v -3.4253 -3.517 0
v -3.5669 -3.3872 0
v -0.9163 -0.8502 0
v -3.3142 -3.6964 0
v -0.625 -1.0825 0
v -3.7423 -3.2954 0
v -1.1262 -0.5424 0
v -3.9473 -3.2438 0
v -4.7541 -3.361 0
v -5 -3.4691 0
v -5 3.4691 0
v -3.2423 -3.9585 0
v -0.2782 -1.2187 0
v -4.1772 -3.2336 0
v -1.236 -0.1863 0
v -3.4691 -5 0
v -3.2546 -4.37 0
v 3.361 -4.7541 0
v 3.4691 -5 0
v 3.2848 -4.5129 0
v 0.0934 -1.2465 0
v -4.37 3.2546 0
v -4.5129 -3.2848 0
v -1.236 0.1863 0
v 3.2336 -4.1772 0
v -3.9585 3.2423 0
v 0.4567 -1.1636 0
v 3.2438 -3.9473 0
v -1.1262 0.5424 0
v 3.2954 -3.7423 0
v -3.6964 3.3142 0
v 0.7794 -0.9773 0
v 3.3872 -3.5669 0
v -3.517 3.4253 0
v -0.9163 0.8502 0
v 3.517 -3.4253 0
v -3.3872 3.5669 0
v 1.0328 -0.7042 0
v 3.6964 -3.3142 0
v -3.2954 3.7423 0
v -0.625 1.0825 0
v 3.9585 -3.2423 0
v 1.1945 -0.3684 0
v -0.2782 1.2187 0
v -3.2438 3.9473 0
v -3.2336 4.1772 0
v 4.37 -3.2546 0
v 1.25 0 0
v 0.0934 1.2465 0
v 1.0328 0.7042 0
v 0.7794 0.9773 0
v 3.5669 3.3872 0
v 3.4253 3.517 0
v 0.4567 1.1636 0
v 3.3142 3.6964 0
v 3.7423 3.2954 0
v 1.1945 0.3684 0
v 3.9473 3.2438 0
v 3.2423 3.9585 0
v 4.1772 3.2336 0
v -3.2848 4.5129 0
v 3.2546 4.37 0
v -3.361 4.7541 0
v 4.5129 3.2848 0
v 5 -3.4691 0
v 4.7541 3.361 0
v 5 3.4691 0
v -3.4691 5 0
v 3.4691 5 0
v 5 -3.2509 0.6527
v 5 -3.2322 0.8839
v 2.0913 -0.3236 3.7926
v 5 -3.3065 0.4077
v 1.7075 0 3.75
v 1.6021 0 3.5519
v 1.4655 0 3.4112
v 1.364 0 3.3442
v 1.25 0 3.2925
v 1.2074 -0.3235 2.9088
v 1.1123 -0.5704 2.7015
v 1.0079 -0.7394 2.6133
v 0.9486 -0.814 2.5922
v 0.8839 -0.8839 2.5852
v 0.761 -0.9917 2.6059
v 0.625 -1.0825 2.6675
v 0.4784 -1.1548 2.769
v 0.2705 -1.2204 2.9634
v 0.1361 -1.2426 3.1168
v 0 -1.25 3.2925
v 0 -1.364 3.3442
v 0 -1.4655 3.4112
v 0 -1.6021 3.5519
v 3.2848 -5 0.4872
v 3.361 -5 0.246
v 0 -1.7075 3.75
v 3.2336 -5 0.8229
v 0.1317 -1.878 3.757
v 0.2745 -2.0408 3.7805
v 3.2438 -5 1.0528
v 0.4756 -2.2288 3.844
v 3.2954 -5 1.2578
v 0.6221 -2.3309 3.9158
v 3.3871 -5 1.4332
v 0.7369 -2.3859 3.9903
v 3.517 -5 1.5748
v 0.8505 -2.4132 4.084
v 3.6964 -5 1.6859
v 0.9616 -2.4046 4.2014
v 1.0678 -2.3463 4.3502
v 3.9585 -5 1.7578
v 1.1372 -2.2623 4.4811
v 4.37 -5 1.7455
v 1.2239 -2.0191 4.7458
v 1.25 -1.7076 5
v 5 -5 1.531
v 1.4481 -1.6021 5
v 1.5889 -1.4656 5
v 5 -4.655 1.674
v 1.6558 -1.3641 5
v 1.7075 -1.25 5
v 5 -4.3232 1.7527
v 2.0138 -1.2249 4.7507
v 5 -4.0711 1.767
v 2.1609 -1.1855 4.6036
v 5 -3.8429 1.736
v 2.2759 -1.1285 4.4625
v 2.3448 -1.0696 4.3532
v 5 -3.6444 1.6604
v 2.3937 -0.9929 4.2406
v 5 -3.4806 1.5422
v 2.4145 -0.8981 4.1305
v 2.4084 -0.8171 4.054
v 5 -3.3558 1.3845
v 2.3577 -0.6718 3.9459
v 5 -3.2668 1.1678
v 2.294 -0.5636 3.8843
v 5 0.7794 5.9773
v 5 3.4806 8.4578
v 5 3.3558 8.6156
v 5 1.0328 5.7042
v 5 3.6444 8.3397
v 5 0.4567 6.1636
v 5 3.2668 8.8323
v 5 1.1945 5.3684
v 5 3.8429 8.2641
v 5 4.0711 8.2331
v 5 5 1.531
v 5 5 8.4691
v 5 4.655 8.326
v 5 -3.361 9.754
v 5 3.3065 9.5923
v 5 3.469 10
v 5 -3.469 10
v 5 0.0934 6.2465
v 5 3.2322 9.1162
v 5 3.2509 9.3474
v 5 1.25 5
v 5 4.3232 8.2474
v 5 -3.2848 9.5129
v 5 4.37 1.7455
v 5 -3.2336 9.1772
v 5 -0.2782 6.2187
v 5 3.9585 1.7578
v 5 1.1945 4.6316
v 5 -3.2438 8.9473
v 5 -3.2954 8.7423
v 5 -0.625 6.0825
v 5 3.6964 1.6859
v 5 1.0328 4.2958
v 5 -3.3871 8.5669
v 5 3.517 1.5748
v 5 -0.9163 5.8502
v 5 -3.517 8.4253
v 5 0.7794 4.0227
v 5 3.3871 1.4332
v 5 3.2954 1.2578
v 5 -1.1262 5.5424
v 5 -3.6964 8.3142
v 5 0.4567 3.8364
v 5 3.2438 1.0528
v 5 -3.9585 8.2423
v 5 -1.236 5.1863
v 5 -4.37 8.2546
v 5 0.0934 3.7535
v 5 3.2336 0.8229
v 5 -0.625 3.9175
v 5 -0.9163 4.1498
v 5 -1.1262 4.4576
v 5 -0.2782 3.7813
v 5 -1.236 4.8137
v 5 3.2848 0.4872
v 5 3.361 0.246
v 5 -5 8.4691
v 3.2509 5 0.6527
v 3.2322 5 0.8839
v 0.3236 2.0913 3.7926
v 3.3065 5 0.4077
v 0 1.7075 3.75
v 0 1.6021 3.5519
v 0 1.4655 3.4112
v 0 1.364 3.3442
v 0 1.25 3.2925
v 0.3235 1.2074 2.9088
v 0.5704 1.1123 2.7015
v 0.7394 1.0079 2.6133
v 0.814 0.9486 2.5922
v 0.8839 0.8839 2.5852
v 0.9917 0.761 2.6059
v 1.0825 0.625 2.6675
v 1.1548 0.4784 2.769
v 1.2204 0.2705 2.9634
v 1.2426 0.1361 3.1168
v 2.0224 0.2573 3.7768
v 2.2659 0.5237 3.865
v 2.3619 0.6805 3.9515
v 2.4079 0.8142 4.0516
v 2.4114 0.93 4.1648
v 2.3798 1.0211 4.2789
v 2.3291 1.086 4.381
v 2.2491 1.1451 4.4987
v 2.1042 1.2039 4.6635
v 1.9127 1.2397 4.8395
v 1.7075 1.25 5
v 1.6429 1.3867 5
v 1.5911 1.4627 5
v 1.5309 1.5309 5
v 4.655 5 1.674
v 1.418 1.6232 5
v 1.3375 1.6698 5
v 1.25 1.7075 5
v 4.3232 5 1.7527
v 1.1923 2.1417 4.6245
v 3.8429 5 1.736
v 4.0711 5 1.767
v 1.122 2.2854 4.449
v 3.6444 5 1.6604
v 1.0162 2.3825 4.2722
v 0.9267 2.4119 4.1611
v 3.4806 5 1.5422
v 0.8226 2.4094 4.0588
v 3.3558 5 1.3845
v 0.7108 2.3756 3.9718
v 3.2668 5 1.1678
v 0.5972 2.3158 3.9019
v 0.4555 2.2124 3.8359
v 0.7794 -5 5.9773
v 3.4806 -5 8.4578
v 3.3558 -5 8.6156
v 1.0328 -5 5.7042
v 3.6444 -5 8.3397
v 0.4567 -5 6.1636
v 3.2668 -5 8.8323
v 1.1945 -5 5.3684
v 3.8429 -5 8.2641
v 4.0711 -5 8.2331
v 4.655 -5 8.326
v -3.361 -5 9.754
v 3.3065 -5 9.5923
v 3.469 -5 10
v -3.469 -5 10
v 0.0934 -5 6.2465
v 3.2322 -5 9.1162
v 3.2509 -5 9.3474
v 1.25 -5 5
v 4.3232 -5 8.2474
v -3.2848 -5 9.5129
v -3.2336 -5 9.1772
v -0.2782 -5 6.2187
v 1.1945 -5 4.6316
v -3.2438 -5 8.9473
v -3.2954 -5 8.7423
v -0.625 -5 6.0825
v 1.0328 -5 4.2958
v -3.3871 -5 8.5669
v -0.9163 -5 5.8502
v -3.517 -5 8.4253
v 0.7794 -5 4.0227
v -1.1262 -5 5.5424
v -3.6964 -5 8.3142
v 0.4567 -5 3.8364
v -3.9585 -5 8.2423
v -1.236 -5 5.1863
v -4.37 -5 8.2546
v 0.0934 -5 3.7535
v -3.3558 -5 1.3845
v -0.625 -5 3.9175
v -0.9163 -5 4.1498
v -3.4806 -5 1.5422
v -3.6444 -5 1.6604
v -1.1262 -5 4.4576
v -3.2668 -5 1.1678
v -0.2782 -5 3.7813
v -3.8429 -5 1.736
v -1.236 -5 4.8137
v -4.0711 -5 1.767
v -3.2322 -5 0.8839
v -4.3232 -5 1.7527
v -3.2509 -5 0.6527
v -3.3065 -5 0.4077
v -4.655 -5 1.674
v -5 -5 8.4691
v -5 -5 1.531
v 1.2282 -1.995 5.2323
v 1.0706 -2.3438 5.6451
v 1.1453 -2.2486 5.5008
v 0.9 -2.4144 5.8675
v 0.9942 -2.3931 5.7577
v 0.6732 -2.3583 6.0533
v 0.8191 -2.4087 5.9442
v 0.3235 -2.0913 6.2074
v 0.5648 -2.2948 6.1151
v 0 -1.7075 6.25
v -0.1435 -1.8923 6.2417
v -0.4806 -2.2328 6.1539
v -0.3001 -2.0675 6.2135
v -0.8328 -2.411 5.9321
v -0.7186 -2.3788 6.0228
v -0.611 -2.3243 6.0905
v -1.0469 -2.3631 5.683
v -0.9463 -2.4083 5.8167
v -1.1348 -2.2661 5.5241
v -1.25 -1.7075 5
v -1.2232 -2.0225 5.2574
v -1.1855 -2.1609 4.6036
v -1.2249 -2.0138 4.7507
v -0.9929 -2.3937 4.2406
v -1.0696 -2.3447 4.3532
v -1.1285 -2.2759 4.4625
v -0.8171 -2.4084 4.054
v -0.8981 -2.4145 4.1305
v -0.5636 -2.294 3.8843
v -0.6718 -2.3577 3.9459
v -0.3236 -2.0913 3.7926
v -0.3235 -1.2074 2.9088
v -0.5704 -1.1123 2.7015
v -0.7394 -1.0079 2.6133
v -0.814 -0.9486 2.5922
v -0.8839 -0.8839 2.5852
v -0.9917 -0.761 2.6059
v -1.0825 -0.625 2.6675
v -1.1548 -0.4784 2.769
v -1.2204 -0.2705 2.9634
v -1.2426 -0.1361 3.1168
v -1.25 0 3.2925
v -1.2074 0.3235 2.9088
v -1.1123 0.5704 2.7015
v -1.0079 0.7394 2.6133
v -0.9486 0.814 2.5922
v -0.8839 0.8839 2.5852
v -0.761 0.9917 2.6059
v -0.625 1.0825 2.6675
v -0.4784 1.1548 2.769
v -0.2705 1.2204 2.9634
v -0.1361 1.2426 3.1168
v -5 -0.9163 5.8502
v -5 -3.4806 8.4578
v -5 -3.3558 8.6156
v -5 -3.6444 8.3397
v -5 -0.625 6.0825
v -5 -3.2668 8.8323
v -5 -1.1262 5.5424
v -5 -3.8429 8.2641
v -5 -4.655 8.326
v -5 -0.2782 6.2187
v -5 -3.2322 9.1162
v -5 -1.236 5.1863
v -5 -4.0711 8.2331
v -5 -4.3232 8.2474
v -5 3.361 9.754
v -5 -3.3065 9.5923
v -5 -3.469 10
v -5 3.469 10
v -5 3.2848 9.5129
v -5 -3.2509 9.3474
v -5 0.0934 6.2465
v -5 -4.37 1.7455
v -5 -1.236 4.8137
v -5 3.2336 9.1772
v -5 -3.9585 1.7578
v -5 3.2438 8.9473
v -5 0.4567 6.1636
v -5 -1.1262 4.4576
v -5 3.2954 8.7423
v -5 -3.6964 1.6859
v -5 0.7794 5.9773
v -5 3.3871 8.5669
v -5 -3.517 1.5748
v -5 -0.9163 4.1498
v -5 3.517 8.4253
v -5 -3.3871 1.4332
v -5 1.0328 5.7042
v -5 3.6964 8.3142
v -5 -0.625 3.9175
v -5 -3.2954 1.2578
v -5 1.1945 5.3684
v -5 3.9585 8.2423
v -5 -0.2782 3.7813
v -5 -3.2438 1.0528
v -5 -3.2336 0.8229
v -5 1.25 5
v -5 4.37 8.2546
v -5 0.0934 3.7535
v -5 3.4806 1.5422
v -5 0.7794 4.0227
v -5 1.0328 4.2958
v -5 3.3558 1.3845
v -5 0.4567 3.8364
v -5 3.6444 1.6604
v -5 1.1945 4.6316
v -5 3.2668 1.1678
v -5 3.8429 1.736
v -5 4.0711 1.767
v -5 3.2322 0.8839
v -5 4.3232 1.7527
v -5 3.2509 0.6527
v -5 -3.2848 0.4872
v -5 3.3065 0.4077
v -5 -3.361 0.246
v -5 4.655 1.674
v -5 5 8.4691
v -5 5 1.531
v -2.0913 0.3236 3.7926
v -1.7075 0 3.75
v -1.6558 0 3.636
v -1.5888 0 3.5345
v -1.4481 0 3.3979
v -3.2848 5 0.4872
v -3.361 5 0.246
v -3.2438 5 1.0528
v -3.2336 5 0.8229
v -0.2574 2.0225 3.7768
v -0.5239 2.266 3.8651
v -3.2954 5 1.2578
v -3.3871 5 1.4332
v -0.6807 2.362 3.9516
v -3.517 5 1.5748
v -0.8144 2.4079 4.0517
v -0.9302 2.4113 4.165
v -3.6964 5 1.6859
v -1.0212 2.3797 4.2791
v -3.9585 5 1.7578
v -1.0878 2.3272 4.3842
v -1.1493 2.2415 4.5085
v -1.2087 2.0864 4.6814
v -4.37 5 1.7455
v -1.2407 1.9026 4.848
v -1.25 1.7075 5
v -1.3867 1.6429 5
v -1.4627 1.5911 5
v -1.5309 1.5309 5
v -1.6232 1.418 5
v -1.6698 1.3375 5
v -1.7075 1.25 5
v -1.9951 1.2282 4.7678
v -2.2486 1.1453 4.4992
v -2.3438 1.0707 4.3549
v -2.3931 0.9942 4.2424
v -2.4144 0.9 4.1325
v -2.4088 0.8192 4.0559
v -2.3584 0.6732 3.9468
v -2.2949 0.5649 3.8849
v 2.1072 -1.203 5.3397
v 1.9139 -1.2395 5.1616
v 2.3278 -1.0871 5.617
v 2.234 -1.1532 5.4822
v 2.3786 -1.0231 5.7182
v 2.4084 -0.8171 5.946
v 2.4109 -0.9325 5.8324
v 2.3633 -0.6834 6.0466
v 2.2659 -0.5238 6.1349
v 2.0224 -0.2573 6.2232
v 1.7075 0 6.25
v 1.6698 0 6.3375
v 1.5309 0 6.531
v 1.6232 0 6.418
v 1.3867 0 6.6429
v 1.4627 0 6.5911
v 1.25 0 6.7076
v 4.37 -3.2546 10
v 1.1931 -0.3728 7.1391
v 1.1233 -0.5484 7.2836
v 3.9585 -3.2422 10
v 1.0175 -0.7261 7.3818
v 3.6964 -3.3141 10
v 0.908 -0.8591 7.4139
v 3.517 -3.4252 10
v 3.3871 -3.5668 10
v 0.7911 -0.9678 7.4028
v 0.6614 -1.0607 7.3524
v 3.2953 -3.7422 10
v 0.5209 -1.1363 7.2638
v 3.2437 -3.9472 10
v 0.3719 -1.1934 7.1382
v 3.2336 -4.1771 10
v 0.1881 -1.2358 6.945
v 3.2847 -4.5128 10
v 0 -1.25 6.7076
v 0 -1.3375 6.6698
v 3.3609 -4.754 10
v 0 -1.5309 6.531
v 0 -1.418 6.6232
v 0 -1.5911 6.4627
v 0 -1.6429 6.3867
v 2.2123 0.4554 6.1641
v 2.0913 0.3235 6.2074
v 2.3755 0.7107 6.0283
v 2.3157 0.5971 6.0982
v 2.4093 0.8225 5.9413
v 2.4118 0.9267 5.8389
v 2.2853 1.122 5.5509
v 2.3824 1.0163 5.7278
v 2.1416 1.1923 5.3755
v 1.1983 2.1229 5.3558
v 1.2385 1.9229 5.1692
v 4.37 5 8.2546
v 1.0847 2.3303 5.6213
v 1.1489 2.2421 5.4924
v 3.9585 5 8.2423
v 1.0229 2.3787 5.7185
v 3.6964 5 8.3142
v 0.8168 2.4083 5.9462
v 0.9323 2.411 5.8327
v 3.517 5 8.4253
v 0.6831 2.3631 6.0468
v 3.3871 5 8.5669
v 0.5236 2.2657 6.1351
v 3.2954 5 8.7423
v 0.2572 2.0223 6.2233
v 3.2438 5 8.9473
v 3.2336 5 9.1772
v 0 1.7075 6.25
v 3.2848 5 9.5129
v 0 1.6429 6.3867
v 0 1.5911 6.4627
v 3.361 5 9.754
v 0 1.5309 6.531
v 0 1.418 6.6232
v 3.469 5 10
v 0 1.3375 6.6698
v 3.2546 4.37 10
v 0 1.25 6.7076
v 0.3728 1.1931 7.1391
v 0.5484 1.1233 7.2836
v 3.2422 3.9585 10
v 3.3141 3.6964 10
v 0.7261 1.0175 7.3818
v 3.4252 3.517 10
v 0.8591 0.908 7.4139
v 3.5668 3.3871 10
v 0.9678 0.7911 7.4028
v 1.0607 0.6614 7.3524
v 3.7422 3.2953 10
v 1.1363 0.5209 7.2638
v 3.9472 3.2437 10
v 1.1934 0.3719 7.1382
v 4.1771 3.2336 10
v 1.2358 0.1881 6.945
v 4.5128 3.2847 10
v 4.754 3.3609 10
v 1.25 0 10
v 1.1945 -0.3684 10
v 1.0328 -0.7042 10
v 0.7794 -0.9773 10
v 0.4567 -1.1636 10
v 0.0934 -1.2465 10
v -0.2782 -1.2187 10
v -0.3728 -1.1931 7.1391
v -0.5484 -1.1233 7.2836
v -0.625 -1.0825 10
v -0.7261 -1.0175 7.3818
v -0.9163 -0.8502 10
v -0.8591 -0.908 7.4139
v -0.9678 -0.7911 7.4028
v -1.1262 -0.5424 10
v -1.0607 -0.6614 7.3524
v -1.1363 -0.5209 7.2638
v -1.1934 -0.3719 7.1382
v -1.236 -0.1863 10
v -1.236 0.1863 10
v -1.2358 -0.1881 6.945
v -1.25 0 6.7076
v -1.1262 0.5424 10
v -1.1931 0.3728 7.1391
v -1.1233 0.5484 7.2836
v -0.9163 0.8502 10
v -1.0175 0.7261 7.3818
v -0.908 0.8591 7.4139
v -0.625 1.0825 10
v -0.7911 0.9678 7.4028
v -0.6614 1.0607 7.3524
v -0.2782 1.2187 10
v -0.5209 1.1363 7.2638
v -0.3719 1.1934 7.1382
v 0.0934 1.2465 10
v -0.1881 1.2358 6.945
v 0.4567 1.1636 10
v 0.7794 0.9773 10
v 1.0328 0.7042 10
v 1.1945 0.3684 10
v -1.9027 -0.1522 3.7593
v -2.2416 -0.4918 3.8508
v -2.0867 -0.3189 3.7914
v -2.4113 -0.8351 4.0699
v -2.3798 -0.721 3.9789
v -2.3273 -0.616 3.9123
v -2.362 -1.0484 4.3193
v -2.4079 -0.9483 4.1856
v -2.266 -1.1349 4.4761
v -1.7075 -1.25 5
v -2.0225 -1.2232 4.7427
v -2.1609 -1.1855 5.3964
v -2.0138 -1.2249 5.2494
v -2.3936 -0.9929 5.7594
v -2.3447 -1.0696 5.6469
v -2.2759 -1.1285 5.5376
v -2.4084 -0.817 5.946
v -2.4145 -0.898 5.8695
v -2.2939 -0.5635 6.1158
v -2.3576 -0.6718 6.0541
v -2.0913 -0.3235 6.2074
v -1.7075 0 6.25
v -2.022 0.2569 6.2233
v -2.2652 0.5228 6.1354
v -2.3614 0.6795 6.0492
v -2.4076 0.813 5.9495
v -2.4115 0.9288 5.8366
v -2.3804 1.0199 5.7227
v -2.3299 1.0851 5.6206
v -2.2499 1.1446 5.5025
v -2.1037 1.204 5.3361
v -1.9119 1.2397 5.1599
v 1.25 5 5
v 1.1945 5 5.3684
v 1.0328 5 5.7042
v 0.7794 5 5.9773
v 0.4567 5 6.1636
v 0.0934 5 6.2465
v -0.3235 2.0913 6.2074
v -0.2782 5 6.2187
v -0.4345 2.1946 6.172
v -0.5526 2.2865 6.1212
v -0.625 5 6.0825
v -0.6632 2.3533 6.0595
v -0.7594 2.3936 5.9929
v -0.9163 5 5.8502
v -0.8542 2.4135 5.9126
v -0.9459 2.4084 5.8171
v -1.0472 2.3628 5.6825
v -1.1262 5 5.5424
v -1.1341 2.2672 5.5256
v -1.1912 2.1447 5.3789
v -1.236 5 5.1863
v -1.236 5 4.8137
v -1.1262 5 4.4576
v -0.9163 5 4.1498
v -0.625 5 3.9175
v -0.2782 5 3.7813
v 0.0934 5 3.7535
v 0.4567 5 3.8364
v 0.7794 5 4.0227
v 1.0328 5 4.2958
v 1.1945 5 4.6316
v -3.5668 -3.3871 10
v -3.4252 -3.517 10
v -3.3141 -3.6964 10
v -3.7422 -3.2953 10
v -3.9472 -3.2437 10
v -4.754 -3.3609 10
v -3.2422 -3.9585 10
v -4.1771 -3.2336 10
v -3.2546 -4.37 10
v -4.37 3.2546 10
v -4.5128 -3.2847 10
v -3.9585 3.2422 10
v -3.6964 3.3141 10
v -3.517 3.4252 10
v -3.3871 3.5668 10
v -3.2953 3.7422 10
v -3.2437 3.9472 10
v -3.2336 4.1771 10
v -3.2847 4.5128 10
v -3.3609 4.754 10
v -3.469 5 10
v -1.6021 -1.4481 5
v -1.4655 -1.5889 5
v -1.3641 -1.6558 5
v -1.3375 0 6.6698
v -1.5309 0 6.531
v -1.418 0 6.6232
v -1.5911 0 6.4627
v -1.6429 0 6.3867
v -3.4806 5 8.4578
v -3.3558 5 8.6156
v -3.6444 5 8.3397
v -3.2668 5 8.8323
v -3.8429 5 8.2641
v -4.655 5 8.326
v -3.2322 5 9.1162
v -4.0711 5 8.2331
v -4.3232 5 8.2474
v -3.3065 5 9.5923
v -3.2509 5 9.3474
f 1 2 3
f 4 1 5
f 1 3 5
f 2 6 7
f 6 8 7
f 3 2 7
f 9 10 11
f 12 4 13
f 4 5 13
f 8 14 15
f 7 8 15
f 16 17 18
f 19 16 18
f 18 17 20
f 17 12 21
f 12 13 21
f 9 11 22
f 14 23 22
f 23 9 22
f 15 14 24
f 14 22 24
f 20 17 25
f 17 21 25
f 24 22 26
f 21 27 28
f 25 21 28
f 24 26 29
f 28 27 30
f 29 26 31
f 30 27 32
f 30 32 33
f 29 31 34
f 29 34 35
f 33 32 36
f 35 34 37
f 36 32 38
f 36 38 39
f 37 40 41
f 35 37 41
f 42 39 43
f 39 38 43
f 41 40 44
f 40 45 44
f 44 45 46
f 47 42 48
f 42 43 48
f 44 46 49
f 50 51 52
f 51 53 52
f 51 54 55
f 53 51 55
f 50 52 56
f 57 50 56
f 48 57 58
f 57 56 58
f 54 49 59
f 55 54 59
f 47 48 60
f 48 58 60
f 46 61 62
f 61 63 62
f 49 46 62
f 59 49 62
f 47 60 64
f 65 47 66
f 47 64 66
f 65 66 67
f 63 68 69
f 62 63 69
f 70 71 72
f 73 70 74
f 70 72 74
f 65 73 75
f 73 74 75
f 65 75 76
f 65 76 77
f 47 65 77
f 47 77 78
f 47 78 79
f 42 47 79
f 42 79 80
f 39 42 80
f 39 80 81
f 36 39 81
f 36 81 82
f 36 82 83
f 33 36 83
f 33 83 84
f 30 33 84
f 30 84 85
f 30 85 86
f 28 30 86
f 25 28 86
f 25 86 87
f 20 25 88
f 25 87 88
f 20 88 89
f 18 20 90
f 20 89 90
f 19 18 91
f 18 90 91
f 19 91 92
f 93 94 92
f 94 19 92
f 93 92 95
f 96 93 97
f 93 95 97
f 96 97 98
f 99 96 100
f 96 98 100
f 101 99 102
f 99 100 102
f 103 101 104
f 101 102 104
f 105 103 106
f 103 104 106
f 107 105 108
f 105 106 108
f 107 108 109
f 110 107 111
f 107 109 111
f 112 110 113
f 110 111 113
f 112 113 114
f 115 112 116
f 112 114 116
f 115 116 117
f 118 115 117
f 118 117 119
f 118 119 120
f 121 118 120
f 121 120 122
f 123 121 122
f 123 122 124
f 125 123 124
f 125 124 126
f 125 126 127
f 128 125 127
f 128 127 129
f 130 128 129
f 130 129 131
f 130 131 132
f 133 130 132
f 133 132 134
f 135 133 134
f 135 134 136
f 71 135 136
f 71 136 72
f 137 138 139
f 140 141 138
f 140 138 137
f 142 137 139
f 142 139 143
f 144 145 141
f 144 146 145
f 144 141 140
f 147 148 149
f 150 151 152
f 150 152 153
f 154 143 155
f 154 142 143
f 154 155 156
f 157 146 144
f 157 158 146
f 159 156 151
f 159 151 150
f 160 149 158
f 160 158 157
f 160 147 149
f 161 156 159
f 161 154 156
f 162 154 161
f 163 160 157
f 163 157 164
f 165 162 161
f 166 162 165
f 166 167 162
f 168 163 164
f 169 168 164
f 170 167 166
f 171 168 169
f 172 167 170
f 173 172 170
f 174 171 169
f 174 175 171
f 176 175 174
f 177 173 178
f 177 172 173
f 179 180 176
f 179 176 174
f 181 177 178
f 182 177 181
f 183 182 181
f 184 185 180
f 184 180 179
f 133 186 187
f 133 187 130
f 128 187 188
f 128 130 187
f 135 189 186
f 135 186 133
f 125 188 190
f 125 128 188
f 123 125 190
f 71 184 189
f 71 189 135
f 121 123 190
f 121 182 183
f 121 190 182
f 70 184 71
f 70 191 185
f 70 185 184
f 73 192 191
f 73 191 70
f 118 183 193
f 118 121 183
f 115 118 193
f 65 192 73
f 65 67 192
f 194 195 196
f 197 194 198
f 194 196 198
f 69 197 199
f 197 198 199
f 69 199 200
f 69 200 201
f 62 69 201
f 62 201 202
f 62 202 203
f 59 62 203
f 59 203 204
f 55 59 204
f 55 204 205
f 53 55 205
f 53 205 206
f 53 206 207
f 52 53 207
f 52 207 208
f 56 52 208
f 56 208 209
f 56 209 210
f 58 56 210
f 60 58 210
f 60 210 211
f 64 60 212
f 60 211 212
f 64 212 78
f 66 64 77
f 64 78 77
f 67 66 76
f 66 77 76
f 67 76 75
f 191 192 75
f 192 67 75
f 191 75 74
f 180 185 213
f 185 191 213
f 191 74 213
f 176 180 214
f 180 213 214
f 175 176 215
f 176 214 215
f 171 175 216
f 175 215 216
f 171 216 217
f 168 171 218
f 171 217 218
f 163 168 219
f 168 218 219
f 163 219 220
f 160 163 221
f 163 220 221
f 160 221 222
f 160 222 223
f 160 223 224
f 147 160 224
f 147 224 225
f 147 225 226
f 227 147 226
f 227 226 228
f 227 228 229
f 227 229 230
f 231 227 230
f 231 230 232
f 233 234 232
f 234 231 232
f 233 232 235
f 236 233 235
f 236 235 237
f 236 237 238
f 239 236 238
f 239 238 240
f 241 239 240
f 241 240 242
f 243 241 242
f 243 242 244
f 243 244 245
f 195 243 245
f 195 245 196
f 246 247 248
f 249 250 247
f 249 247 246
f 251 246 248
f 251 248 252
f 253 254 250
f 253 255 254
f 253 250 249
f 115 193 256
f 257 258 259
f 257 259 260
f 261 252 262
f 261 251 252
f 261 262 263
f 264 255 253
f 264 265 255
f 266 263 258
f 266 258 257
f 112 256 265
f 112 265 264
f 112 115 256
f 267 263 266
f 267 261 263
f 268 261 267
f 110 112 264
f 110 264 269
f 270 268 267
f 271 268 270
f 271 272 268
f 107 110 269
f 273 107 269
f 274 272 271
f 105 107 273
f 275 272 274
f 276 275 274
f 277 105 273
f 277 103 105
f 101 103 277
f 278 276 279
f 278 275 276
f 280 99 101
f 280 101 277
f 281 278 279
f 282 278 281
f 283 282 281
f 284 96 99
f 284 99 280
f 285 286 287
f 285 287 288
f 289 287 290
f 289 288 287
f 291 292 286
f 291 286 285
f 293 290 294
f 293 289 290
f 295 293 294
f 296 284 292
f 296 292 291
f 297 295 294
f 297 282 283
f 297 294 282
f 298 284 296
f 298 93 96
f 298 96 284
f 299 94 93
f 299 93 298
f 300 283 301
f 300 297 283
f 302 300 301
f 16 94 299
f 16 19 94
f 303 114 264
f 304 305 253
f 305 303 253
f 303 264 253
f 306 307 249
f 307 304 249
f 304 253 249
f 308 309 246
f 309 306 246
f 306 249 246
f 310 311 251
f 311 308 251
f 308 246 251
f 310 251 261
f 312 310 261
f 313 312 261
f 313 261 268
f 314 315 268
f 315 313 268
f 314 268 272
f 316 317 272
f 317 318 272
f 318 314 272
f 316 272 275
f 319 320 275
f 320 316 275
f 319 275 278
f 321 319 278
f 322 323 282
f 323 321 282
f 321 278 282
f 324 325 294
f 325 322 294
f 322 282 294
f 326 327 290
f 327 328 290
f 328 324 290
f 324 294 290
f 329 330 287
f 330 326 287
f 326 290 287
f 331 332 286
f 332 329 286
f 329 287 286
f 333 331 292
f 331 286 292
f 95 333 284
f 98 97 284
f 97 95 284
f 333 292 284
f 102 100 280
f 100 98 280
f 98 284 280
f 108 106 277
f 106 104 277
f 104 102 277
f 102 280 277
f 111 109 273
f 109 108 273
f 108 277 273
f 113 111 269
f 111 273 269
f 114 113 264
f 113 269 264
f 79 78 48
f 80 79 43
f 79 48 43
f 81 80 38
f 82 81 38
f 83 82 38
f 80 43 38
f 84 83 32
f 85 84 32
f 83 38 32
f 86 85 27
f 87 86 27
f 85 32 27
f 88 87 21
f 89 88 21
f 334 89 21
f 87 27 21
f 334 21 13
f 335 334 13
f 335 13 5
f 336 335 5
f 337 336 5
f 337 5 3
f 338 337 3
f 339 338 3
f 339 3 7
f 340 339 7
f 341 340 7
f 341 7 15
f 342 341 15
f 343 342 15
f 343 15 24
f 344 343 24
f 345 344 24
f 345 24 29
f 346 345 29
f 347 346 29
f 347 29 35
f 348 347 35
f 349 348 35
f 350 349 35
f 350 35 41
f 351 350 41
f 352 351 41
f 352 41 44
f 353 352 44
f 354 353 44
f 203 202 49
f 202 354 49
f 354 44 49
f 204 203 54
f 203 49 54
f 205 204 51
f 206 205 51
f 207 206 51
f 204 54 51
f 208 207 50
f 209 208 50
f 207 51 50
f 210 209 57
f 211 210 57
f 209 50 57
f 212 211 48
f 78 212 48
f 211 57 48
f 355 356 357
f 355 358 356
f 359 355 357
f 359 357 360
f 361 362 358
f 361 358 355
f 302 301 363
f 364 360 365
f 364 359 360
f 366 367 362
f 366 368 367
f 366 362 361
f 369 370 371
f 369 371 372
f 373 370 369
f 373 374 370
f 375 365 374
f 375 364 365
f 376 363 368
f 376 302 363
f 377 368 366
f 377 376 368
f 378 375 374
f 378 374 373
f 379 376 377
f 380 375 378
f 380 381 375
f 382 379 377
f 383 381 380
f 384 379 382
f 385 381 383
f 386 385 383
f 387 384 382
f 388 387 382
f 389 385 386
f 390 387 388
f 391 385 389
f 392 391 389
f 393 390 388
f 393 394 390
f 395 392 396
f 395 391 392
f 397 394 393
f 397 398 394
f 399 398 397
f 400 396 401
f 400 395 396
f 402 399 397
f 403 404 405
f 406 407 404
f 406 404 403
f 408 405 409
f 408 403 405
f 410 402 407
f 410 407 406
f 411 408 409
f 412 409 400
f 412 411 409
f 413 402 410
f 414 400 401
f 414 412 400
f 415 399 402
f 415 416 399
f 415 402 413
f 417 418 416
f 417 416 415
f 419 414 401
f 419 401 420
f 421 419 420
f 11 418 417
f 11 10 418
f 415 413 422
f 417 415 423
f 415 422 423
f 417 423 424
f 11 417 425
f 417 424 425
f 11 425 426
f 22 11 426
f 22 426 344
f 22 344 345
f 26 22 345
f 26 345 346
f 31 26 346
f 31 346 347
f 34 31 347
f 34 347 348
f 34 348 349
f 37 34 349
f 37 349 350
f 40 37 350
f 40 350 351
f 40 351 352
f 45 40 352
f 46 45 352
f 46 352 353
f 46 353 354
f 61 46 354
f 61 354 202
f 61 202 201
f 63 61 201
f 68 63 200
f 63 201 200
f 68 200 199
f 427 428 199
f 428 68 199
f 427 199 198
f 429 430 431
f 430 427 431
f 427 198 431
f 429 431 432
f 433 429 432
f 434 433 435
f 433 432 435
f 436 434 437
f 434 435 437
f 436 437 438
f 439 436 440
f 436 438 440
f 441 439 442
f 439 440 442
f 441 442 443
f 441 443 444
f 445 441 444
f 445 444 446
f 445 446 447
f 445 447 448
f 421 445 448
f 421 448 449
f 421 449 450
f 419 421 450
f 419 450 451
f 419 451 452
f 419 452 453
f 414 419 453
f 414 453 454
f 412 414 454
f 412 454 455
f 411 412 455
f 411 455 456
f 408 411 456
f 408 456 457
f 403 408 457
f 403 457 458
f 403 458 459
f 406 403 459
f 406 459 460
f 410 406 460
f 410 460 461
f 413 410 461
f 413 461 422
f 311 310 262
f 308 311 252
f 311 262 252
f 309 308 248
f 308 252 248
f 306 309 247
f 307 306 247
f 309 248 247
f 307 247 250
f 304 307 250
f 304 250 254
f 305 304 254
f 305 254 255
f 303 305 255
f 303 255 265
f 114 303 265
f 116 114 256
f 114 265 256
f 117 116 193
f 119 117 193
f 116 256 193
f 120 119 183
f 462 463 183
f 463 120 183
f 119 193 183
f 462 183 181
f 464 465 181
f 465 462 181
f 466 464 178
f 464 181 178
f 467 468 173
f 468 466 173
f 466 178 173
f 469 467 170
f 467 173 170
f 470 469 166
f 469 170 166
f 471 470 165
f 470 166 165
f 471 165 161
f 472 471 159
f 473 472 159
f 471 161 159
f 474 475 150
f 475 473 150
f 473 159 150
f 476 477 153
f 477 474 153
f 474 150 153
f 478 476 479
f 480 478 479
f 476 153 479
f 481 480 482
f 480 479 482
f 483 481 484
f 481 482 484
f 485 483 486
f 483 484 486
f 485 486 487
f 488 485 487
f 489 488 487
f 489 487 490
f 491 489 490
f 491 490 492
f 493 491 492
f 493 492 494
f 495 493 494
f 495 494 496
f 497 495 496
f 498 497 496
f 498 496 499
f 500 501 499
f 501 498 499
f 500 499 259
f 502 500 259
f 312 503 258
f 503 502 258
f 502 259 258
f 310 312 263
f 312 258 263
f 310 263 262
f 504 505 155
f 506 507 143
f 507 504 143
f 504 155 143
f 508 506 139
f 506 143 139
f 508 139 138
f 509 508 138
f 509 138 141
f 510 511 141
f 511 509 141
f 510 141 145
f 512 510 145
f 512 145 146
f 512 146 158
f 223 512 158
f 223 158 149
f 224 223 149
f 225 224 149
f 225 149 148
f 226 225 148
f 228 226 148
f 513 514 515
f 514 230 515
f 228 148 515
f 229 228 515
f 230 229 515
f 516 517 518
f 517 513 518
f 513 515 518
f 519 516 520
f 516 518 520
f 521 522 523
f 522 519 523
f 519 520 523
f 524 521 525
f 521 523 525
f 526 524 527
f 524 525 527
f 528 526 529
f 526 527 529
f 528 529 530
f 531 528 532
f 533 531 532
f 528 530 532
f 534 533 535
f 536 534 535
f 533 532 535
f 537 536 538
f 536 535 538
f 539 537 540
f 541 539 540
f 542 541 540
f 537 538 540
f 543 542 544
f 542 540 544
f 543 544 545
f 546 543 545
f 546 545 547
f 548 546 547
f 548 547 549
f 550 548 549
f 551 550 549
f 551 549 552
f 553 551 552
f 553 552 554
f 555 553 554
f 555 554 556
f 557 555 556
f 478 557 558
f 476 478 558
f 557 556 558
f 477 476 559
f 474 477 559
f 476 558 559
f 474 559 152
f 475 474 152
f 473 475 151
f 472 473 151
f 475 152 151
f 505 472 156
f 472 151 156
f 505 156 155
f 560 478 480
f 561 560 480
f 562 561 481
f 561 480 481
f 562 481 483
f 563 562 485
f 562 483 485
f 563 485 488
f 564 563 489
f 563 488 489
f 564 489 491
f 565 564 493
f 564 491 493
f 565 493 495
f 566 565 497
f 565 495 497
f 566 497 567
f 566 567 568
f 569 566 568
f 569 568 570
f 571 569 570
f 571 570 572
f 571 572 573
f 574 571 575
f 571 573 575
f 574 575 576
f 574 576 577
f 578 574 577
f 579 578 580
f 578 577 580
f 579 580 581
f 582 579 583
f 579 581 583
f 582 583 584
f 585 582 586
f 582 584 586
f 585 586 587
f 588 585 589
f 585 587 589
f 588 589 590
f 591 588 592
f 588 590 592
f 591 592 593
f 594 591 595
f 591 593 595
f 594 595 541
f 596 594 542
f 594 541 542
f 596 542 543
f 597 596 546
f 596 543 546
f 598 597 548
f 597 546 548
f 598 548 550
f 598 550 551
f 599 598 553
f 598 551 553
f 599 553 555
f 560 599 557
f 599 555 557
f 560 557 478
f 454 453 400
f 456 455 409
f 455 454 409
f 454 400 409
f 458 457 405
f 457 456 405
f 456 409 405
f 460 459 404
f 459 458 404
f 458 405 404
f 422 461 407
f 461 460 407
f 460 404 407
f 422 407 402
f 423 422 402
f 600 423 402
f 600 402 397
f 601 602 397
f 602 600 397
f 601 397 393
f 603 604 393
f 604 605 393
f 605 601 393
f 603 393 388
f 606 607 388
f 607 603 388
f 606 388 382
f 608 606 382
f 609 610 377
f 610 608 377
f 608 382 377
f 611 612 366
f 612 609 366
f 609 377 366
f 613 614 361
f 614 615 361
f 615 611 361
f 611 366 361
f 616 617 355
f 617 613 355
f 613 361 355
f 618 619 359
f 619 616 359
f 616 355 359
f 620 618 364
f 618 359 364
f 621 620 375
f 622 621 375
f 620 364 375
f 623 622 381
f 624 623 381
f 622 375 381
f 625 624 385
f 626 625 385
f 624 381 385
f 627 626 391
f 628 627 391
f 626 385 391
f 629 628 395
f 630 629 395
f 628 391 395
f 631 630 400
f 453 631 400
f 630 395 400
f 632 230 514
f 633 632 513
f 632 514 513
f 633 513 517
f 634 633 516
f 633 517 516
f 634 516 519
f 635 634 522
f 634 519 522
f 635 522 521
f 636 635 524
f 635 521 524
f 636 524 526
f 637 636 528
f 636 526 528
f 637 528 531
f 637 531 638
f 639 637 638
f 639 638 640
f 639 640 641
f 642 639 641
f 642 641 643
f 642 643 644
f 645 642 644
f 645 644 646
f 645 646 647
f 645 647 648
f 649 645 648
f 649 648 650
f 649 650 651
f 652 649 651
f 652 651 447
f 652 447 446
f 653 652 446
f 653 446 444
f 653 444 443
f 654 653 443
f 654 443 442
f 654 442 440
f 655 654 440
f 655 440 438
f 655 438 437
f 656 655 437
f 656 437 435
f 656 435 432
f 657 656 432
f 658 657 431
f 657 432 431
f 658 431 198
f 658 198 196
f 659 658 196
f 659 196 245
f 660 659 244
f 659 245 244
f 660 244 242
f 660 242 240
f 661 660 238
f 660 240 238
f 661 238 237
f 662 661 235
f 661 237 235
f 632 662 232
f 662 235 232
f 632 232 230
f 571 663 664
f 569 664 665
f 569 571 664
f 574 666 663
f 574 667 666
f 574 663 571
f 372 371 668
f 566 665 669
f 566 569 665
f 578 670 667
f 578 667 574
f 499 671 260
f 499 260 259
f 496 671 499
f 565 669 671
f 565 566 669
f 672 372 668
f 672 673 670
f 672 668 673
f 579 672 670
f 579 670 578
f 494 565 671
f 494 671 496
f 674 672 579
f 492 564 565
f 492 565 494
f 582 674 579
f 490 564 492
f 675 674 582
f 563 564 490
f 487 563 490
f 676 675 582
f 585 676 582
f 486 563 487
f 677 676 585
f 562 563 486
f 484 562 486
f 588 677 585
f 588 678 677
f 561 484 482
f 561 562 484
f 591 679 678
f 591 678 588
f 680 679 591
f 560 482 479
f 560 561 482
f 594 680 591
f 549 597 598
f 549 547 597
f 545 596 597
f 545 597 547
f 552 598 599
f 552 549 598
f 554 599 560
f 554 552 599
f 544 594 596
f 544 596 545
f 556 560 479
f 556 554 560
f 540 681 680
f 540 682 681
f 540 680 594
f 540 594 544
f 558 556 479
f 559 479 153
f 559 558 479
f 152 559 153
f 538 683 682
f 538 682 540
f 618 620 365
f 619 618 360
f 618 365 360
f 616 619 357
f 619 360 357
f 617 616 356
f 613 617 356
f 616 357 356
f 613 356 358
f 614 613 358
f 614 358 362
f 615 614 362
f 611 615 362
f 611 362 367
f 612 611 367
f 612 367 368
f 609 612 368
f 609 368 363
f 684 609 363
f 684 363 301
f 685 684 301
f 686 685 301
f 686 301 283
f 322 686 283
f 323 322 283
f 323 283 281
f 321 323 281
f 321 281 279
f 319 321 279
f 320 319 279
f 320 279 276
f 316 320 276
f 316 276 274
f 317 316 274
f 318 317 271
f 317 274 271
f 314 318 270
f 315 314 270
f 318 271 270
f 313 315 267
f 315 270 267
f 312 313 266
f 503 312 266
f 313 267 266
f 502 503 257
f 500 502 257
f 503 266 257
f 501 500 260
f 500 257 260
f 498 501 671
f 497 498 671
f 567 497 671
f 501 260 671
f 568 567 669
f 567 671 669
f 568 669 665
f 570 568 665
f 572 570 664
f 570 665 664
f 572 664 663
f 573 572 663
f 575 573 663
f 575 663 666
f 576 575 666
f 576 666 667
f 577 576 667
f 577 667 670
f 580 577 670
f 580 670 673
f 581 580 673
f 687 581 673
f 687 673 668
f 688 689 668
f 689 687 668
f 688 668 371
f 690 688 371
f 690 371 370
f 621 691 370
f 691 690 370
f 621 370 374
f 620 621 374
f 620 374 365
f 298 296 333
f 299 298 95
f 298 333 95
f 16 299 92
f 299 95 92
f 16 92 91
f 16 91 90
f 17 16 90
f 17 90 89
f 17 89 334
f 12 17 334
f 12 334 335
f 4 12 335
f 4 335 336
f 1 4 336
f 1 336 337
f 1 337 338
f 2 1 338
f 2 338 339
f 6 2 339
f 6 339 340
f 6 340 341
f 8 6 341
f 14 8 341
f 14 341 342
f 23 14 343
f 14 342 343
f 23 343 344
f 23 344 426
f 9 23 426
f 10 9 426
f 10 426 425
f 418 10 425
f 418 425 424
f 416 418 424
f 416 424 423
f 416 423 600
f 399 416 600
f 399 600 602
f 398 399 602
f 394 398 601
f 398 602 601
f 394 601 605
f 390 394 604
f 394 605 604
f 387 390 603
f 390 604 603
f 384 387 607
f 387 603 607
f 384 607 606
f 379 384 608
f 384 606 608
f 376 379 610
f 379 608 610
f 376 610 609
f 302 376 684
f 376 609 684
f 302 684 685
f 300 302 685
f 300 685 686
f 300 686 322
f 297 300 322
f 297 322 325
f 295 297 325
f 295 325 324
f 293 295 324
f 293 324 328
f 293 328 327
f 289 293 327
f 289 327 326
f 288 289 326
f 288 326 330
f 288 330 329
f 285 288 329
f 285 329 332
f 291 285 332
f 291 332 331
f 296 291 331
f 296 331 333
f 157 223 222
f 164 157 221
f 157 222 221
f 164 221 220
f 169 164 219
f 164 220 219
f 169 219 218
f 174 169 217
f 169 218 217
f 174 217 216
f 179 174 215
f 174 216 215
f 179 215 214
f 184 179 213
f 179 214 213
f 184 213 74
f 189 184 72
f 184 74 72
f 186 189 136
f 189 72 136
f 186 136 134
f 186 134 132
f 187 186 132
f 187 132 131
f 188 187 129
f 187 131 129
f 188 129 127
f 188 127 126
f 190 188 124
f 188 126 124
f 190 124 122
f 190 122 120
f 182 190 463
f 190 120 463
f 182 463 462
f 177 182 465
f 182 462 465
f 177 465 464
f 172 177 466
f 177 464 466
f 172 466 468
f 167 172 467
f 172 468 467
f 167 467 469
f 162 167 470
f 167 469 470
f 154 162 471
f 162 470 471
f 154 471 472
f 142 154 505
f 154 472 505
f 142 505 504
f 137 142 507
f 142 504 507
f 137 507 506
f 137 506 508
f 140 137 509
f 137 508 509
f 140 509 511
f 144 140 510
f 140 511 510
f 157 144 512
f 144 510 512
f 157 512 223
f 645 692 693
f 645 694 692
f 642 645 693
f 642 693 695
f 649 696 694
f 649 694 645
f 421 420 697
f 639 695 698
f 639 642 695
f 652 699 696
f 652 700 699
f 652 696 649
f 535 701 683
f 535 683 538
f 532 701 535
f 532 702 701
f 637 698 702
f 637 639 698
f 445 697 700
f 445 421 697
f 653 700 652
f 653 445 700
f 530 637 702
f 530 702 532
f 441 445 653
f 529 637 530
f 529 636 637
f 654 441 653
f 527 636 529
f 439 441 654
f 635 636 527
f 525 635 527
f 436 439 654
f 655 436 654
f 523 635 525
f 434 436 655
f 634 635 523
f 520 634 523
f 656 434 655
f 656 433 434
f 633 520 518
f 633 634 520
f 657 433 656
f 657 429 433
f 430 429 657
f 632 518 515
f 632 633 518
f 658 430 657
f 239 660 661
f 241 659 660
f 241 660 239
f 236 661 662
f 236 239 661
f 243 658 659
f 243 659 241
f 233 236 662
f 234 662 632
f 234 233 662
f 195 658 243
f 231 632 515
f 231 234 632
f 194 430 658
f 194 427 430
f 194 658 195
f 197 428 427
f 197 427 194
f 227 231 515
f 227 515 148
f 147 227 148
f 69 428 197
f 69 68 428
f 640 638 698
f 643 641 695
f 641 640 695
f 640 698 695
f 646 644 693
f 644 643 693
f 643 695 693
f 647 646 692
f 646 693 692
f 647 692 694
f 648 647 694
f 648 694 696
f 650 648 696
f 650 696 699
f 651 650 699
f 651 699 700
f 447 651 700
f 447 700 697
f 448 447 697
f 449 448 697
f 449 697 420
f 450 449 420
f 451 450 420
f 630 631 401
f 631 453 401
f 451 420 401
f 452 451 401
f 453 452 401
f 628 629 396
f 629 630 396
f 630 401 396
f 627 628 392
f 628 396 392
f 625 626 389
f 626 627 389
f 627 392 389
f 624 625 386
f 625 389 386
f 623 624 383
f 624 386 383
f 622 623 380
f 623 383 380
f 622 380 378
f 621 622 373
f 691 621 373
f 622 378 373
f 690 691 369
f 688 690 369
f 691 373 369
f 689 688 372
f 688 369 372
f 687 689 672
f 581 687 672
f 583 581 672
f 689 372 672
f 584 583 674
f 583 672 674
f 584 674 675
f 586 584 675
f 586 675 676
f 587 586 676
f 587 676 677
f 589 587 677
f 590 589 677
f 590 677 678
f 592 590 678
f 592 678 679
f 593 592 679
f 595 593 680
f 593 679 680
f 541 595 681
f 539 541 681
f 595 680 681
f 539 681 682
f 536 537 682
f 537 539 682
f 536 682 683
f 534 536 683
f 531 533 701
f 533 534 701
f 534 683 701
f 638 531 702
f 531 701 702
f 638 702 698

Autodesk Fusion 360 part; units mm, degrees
sketch "Sketch1" plane through (0, 0, 0) normal (0, 0, 1) x (1, 0, 0)
  circle A0 centre (0, 0) radius 1.25
  line L0 (5, -5) -> (-5, -5)
  line L1 (-5, -5) -> (-5, 5)
  line L2 (-5, 5) -> (5, 5)
  line L3 (5, 5) -> (5, -5)
  line L4 (5, -5) -> (-5, 5) construction
  line L5 (-5, -5) -> (5, 5) construction
  line L6 (0, -5) -> (0, 5) construction
  line L7 (5, 0) -> (-5, 0) construction
  dimension "d1" = 2.5
  dimension "d3" = 10
  dimension "d4" = 10
ref_plane "WorkPlane1" through (0, -5, 0) normal (0, 1, 0) x (-1, 0, 0)
sketch "Sketch2" plane through (0, -5, 0) normal (0, 1, 0) x (1, 0, 0)
  line L0 (-5, 0) -> (5, 0)
  line L1 (5, 0) -> (5, -10)
  line L2 (5, -10) -> (-5, -10)
  line L3 (-5, -10) -> (-5, 0)
  line L4 (0, 0) -> (0, -10) construction
  circle A0 centre (0, -5) radius 1.25
  point P0 (5, 0)
  point P1 (-5, 0)
  point P2 (5, 0)
  dimension "d6" = 10
  dimension "d8" = 2.5
ref_plane "WorkPlane2" through (-5, 0, 0) normal (1, 0, 0) x (0, 1, 0)
sketch "Sketch3" plane through (-5, 0, 0) normal (1, 0, 0) x (0, 1, 0)
  line L0 (5, 0) -> (-5, 0)
  line L1 (-5, 0) -> (-5, 10)
  line L2 (-5, 10) -> (5, 10)
  line L3 (5, 10) -> (5, 0)
  line L4 (0, 0) -> (0, 10) construction
  circle A0 centre (0, 5) radius 1.25
  point P0 (-5, 0)
  point P1 (-5, 10)
  point P2 (5, 0)
  dimension "d10" = 2.5
ref_plane "WorkPlane3" through (0, 5, 0) normal (0, -1, 0) x (1, 0, 0)
sketch "Sketch4" plane through (0, 5, 0) normal (0, -1, 0) x (1, 0, 0)
  line L0 (5, 0) -> (5, 10)
  line L1 (5, 10) -> (-5, 10)
  circle A0 centre (0, 5) radius 1.25
  line L2 (-5, 0) -> (-5, 10)
  line L3 (-5, 0) -> (5, 0)
ref_plane "WorkPlane4" through (5, 0, 0) normal (-1, 0, 0) x (0, -1, 0)
sketch "Sketch5" plane through (5, 0, 0) normal (-1, 0, 0) x (0, 1, 0)
  line L0 (-5, -10) -> (-5, 0)
  line L1 (-5, -10) -> (5, -10)
  circle A0 centre (0, -5) radius 1.25
  line L2 (5, 0) -> (-5, 0)
  line L3 (5, -10) -> (5, 0)
ref_plane "WorkPlane5" through (0, -5, 10) normal (0, 0, 1) x (-1, 0, 0)
sketch "Sketch6" plane through (0, -5, 10) normal (0, 0, 1) x (1, 0, 0)
  line L0 (-5, 0) -> (5, 0)
  circle A0 centre (0, 5) radius 1.25
  line L1 (-5, 10) -> (5, 10)
  line L2 (-5, 0) -> (-5, 10)
  line L3 (5, 10) -> (5, 0)
ref_plane "WorkPlane6" through (-5, 5, 0) normal (0.5774, -0.5774, -0.5774) x (0.7071, 0.7071, 0)
ref_plane "WorkPlane7" through (-8.3333, 8.3333, 3.3333) normal (0.5774, -0.5774, -0.5774) x (0.7071, 0.7071, 0)
sketch "Sketch7" plane through (-8.3333, 8.3333, 3.3333) normal (0.5774, -0.5774, -0.5774) x (0.7071, 0.7071, 0)
  circle A0 centre (0, 8.165) radius 1.25
  point P0 (0, 8.165)
  point P1 (0, 8.165)
  point P2 (0, 8.165)
  dimension "d25" = 2.5
ref_plane "WorkPlane8" through (-5, -5, 0) normal (0.5774, 0.5774, -0.5774) x (-0.7071, 0.7071, 0)
ref_plane "WorkPlane9" through (-8.3333, -8.3333, 3.3333) normal (0.5774, 0.5774, -0.5774) x (-0.7071, 0.7071, 0)
sketch "Sketch8" plane through (-8.3333, -8.3333, 3.3333) normal (0.5774, 0.5774, -0.5774) x (-0.7071, 0.7071, 0)
  circle A0 centre (0, 8.165) radius 1.25
  point P0 (0, 8.165)
  point P1 (0, 8.165)
  point P2 (0, 8.165)
  dimension "d24" = 2.5
ref_plane "WorkPlane10" through (5, -5, 0) normal (-0.5774, 0.5774, -0.5774) x (-0.7071, -0.7071, 0)
ref_plane "WorkPlane11" through (8.3333, -8.3333, 3.3333) normal (-0.5774, 0.5774, -0.5774) x (-0.7071, -0.7071, 0)
sketch "Sketch9" plane through (8.3333, -8.3333, 3.3333) normal (-0.5774, 0.5774, -0.5774) x (-0.7071, -0.7071, 0)
  circle A0 centre (0, 8.165) radius 1.25
  point P0 (0, 8.165)
  point P1 (0, 8.165)
  point P2 (0, 8.165)
  dimension "d23" = 2.5
ref_plane "WorkPlane12" through (5, 5, 0) normal (-0.5774, -0.5774, -0.5774) x (0.7071, -0.7071, 0)
ref_plane "WorkPlane13" through (8.3333, 8.3333, 3.3333) normal (-0.5774, -0.5774, -0.5774) x (0.7071, -0.7071, 0)
sketch "Sketch10" plane through (8.3333, 8.3333, 3.3333) normal (-0.5774, -0.5774, -0.5774) x (0.7071, -0.7071, 0)
  circle A0 centre (0, 8.165) radius 1.25
  point P0 (0, 8.165)
  point P1 (0, 8.165)
  point P2 (0, 8.165)
  dimension "d22" = 2.5
extrude "Extrude1" add sketch "Sketch1" along normal up to surface (10 mm away) contours A0 | L0 L1 L2 L3
extrude "Extrude2" cut sketch "Sketch3" along normal through all contours A0
extrude "Extrude3" cut sketch "Sketch2" along normal through all contours A0
extrude "Extrude4" cut sketch "Sketch1" along normal through all contours A0
extrude "Extrude5" cut sketch "Sketch10" along normal through all
extrude "Extrude6" cut sketch "Sketch7" along normal through all
extrude "Extrude7" cut sketch "Sketch8" along normal through all
extrude "Extrude8" cut sketch "Sketch9" along normal through all
equation "d1 = TubeDiamter"
equation "TubeDiamter = 2.5 mm"
equation "d3 = CubeSize"
equation "d4 = CubeSize"
equation "d6 = CubeSize"
equation "CubeSize = 10 mm"
equation "d8 = TubeDiamter"
equation "d10 = TubeDiamter"
equation "d22 = TubeDiamter"
equation "d23 = TubeDiamter"
equation "d24 = TubeDiamter"
equation "d25 = TubeDiamter"
